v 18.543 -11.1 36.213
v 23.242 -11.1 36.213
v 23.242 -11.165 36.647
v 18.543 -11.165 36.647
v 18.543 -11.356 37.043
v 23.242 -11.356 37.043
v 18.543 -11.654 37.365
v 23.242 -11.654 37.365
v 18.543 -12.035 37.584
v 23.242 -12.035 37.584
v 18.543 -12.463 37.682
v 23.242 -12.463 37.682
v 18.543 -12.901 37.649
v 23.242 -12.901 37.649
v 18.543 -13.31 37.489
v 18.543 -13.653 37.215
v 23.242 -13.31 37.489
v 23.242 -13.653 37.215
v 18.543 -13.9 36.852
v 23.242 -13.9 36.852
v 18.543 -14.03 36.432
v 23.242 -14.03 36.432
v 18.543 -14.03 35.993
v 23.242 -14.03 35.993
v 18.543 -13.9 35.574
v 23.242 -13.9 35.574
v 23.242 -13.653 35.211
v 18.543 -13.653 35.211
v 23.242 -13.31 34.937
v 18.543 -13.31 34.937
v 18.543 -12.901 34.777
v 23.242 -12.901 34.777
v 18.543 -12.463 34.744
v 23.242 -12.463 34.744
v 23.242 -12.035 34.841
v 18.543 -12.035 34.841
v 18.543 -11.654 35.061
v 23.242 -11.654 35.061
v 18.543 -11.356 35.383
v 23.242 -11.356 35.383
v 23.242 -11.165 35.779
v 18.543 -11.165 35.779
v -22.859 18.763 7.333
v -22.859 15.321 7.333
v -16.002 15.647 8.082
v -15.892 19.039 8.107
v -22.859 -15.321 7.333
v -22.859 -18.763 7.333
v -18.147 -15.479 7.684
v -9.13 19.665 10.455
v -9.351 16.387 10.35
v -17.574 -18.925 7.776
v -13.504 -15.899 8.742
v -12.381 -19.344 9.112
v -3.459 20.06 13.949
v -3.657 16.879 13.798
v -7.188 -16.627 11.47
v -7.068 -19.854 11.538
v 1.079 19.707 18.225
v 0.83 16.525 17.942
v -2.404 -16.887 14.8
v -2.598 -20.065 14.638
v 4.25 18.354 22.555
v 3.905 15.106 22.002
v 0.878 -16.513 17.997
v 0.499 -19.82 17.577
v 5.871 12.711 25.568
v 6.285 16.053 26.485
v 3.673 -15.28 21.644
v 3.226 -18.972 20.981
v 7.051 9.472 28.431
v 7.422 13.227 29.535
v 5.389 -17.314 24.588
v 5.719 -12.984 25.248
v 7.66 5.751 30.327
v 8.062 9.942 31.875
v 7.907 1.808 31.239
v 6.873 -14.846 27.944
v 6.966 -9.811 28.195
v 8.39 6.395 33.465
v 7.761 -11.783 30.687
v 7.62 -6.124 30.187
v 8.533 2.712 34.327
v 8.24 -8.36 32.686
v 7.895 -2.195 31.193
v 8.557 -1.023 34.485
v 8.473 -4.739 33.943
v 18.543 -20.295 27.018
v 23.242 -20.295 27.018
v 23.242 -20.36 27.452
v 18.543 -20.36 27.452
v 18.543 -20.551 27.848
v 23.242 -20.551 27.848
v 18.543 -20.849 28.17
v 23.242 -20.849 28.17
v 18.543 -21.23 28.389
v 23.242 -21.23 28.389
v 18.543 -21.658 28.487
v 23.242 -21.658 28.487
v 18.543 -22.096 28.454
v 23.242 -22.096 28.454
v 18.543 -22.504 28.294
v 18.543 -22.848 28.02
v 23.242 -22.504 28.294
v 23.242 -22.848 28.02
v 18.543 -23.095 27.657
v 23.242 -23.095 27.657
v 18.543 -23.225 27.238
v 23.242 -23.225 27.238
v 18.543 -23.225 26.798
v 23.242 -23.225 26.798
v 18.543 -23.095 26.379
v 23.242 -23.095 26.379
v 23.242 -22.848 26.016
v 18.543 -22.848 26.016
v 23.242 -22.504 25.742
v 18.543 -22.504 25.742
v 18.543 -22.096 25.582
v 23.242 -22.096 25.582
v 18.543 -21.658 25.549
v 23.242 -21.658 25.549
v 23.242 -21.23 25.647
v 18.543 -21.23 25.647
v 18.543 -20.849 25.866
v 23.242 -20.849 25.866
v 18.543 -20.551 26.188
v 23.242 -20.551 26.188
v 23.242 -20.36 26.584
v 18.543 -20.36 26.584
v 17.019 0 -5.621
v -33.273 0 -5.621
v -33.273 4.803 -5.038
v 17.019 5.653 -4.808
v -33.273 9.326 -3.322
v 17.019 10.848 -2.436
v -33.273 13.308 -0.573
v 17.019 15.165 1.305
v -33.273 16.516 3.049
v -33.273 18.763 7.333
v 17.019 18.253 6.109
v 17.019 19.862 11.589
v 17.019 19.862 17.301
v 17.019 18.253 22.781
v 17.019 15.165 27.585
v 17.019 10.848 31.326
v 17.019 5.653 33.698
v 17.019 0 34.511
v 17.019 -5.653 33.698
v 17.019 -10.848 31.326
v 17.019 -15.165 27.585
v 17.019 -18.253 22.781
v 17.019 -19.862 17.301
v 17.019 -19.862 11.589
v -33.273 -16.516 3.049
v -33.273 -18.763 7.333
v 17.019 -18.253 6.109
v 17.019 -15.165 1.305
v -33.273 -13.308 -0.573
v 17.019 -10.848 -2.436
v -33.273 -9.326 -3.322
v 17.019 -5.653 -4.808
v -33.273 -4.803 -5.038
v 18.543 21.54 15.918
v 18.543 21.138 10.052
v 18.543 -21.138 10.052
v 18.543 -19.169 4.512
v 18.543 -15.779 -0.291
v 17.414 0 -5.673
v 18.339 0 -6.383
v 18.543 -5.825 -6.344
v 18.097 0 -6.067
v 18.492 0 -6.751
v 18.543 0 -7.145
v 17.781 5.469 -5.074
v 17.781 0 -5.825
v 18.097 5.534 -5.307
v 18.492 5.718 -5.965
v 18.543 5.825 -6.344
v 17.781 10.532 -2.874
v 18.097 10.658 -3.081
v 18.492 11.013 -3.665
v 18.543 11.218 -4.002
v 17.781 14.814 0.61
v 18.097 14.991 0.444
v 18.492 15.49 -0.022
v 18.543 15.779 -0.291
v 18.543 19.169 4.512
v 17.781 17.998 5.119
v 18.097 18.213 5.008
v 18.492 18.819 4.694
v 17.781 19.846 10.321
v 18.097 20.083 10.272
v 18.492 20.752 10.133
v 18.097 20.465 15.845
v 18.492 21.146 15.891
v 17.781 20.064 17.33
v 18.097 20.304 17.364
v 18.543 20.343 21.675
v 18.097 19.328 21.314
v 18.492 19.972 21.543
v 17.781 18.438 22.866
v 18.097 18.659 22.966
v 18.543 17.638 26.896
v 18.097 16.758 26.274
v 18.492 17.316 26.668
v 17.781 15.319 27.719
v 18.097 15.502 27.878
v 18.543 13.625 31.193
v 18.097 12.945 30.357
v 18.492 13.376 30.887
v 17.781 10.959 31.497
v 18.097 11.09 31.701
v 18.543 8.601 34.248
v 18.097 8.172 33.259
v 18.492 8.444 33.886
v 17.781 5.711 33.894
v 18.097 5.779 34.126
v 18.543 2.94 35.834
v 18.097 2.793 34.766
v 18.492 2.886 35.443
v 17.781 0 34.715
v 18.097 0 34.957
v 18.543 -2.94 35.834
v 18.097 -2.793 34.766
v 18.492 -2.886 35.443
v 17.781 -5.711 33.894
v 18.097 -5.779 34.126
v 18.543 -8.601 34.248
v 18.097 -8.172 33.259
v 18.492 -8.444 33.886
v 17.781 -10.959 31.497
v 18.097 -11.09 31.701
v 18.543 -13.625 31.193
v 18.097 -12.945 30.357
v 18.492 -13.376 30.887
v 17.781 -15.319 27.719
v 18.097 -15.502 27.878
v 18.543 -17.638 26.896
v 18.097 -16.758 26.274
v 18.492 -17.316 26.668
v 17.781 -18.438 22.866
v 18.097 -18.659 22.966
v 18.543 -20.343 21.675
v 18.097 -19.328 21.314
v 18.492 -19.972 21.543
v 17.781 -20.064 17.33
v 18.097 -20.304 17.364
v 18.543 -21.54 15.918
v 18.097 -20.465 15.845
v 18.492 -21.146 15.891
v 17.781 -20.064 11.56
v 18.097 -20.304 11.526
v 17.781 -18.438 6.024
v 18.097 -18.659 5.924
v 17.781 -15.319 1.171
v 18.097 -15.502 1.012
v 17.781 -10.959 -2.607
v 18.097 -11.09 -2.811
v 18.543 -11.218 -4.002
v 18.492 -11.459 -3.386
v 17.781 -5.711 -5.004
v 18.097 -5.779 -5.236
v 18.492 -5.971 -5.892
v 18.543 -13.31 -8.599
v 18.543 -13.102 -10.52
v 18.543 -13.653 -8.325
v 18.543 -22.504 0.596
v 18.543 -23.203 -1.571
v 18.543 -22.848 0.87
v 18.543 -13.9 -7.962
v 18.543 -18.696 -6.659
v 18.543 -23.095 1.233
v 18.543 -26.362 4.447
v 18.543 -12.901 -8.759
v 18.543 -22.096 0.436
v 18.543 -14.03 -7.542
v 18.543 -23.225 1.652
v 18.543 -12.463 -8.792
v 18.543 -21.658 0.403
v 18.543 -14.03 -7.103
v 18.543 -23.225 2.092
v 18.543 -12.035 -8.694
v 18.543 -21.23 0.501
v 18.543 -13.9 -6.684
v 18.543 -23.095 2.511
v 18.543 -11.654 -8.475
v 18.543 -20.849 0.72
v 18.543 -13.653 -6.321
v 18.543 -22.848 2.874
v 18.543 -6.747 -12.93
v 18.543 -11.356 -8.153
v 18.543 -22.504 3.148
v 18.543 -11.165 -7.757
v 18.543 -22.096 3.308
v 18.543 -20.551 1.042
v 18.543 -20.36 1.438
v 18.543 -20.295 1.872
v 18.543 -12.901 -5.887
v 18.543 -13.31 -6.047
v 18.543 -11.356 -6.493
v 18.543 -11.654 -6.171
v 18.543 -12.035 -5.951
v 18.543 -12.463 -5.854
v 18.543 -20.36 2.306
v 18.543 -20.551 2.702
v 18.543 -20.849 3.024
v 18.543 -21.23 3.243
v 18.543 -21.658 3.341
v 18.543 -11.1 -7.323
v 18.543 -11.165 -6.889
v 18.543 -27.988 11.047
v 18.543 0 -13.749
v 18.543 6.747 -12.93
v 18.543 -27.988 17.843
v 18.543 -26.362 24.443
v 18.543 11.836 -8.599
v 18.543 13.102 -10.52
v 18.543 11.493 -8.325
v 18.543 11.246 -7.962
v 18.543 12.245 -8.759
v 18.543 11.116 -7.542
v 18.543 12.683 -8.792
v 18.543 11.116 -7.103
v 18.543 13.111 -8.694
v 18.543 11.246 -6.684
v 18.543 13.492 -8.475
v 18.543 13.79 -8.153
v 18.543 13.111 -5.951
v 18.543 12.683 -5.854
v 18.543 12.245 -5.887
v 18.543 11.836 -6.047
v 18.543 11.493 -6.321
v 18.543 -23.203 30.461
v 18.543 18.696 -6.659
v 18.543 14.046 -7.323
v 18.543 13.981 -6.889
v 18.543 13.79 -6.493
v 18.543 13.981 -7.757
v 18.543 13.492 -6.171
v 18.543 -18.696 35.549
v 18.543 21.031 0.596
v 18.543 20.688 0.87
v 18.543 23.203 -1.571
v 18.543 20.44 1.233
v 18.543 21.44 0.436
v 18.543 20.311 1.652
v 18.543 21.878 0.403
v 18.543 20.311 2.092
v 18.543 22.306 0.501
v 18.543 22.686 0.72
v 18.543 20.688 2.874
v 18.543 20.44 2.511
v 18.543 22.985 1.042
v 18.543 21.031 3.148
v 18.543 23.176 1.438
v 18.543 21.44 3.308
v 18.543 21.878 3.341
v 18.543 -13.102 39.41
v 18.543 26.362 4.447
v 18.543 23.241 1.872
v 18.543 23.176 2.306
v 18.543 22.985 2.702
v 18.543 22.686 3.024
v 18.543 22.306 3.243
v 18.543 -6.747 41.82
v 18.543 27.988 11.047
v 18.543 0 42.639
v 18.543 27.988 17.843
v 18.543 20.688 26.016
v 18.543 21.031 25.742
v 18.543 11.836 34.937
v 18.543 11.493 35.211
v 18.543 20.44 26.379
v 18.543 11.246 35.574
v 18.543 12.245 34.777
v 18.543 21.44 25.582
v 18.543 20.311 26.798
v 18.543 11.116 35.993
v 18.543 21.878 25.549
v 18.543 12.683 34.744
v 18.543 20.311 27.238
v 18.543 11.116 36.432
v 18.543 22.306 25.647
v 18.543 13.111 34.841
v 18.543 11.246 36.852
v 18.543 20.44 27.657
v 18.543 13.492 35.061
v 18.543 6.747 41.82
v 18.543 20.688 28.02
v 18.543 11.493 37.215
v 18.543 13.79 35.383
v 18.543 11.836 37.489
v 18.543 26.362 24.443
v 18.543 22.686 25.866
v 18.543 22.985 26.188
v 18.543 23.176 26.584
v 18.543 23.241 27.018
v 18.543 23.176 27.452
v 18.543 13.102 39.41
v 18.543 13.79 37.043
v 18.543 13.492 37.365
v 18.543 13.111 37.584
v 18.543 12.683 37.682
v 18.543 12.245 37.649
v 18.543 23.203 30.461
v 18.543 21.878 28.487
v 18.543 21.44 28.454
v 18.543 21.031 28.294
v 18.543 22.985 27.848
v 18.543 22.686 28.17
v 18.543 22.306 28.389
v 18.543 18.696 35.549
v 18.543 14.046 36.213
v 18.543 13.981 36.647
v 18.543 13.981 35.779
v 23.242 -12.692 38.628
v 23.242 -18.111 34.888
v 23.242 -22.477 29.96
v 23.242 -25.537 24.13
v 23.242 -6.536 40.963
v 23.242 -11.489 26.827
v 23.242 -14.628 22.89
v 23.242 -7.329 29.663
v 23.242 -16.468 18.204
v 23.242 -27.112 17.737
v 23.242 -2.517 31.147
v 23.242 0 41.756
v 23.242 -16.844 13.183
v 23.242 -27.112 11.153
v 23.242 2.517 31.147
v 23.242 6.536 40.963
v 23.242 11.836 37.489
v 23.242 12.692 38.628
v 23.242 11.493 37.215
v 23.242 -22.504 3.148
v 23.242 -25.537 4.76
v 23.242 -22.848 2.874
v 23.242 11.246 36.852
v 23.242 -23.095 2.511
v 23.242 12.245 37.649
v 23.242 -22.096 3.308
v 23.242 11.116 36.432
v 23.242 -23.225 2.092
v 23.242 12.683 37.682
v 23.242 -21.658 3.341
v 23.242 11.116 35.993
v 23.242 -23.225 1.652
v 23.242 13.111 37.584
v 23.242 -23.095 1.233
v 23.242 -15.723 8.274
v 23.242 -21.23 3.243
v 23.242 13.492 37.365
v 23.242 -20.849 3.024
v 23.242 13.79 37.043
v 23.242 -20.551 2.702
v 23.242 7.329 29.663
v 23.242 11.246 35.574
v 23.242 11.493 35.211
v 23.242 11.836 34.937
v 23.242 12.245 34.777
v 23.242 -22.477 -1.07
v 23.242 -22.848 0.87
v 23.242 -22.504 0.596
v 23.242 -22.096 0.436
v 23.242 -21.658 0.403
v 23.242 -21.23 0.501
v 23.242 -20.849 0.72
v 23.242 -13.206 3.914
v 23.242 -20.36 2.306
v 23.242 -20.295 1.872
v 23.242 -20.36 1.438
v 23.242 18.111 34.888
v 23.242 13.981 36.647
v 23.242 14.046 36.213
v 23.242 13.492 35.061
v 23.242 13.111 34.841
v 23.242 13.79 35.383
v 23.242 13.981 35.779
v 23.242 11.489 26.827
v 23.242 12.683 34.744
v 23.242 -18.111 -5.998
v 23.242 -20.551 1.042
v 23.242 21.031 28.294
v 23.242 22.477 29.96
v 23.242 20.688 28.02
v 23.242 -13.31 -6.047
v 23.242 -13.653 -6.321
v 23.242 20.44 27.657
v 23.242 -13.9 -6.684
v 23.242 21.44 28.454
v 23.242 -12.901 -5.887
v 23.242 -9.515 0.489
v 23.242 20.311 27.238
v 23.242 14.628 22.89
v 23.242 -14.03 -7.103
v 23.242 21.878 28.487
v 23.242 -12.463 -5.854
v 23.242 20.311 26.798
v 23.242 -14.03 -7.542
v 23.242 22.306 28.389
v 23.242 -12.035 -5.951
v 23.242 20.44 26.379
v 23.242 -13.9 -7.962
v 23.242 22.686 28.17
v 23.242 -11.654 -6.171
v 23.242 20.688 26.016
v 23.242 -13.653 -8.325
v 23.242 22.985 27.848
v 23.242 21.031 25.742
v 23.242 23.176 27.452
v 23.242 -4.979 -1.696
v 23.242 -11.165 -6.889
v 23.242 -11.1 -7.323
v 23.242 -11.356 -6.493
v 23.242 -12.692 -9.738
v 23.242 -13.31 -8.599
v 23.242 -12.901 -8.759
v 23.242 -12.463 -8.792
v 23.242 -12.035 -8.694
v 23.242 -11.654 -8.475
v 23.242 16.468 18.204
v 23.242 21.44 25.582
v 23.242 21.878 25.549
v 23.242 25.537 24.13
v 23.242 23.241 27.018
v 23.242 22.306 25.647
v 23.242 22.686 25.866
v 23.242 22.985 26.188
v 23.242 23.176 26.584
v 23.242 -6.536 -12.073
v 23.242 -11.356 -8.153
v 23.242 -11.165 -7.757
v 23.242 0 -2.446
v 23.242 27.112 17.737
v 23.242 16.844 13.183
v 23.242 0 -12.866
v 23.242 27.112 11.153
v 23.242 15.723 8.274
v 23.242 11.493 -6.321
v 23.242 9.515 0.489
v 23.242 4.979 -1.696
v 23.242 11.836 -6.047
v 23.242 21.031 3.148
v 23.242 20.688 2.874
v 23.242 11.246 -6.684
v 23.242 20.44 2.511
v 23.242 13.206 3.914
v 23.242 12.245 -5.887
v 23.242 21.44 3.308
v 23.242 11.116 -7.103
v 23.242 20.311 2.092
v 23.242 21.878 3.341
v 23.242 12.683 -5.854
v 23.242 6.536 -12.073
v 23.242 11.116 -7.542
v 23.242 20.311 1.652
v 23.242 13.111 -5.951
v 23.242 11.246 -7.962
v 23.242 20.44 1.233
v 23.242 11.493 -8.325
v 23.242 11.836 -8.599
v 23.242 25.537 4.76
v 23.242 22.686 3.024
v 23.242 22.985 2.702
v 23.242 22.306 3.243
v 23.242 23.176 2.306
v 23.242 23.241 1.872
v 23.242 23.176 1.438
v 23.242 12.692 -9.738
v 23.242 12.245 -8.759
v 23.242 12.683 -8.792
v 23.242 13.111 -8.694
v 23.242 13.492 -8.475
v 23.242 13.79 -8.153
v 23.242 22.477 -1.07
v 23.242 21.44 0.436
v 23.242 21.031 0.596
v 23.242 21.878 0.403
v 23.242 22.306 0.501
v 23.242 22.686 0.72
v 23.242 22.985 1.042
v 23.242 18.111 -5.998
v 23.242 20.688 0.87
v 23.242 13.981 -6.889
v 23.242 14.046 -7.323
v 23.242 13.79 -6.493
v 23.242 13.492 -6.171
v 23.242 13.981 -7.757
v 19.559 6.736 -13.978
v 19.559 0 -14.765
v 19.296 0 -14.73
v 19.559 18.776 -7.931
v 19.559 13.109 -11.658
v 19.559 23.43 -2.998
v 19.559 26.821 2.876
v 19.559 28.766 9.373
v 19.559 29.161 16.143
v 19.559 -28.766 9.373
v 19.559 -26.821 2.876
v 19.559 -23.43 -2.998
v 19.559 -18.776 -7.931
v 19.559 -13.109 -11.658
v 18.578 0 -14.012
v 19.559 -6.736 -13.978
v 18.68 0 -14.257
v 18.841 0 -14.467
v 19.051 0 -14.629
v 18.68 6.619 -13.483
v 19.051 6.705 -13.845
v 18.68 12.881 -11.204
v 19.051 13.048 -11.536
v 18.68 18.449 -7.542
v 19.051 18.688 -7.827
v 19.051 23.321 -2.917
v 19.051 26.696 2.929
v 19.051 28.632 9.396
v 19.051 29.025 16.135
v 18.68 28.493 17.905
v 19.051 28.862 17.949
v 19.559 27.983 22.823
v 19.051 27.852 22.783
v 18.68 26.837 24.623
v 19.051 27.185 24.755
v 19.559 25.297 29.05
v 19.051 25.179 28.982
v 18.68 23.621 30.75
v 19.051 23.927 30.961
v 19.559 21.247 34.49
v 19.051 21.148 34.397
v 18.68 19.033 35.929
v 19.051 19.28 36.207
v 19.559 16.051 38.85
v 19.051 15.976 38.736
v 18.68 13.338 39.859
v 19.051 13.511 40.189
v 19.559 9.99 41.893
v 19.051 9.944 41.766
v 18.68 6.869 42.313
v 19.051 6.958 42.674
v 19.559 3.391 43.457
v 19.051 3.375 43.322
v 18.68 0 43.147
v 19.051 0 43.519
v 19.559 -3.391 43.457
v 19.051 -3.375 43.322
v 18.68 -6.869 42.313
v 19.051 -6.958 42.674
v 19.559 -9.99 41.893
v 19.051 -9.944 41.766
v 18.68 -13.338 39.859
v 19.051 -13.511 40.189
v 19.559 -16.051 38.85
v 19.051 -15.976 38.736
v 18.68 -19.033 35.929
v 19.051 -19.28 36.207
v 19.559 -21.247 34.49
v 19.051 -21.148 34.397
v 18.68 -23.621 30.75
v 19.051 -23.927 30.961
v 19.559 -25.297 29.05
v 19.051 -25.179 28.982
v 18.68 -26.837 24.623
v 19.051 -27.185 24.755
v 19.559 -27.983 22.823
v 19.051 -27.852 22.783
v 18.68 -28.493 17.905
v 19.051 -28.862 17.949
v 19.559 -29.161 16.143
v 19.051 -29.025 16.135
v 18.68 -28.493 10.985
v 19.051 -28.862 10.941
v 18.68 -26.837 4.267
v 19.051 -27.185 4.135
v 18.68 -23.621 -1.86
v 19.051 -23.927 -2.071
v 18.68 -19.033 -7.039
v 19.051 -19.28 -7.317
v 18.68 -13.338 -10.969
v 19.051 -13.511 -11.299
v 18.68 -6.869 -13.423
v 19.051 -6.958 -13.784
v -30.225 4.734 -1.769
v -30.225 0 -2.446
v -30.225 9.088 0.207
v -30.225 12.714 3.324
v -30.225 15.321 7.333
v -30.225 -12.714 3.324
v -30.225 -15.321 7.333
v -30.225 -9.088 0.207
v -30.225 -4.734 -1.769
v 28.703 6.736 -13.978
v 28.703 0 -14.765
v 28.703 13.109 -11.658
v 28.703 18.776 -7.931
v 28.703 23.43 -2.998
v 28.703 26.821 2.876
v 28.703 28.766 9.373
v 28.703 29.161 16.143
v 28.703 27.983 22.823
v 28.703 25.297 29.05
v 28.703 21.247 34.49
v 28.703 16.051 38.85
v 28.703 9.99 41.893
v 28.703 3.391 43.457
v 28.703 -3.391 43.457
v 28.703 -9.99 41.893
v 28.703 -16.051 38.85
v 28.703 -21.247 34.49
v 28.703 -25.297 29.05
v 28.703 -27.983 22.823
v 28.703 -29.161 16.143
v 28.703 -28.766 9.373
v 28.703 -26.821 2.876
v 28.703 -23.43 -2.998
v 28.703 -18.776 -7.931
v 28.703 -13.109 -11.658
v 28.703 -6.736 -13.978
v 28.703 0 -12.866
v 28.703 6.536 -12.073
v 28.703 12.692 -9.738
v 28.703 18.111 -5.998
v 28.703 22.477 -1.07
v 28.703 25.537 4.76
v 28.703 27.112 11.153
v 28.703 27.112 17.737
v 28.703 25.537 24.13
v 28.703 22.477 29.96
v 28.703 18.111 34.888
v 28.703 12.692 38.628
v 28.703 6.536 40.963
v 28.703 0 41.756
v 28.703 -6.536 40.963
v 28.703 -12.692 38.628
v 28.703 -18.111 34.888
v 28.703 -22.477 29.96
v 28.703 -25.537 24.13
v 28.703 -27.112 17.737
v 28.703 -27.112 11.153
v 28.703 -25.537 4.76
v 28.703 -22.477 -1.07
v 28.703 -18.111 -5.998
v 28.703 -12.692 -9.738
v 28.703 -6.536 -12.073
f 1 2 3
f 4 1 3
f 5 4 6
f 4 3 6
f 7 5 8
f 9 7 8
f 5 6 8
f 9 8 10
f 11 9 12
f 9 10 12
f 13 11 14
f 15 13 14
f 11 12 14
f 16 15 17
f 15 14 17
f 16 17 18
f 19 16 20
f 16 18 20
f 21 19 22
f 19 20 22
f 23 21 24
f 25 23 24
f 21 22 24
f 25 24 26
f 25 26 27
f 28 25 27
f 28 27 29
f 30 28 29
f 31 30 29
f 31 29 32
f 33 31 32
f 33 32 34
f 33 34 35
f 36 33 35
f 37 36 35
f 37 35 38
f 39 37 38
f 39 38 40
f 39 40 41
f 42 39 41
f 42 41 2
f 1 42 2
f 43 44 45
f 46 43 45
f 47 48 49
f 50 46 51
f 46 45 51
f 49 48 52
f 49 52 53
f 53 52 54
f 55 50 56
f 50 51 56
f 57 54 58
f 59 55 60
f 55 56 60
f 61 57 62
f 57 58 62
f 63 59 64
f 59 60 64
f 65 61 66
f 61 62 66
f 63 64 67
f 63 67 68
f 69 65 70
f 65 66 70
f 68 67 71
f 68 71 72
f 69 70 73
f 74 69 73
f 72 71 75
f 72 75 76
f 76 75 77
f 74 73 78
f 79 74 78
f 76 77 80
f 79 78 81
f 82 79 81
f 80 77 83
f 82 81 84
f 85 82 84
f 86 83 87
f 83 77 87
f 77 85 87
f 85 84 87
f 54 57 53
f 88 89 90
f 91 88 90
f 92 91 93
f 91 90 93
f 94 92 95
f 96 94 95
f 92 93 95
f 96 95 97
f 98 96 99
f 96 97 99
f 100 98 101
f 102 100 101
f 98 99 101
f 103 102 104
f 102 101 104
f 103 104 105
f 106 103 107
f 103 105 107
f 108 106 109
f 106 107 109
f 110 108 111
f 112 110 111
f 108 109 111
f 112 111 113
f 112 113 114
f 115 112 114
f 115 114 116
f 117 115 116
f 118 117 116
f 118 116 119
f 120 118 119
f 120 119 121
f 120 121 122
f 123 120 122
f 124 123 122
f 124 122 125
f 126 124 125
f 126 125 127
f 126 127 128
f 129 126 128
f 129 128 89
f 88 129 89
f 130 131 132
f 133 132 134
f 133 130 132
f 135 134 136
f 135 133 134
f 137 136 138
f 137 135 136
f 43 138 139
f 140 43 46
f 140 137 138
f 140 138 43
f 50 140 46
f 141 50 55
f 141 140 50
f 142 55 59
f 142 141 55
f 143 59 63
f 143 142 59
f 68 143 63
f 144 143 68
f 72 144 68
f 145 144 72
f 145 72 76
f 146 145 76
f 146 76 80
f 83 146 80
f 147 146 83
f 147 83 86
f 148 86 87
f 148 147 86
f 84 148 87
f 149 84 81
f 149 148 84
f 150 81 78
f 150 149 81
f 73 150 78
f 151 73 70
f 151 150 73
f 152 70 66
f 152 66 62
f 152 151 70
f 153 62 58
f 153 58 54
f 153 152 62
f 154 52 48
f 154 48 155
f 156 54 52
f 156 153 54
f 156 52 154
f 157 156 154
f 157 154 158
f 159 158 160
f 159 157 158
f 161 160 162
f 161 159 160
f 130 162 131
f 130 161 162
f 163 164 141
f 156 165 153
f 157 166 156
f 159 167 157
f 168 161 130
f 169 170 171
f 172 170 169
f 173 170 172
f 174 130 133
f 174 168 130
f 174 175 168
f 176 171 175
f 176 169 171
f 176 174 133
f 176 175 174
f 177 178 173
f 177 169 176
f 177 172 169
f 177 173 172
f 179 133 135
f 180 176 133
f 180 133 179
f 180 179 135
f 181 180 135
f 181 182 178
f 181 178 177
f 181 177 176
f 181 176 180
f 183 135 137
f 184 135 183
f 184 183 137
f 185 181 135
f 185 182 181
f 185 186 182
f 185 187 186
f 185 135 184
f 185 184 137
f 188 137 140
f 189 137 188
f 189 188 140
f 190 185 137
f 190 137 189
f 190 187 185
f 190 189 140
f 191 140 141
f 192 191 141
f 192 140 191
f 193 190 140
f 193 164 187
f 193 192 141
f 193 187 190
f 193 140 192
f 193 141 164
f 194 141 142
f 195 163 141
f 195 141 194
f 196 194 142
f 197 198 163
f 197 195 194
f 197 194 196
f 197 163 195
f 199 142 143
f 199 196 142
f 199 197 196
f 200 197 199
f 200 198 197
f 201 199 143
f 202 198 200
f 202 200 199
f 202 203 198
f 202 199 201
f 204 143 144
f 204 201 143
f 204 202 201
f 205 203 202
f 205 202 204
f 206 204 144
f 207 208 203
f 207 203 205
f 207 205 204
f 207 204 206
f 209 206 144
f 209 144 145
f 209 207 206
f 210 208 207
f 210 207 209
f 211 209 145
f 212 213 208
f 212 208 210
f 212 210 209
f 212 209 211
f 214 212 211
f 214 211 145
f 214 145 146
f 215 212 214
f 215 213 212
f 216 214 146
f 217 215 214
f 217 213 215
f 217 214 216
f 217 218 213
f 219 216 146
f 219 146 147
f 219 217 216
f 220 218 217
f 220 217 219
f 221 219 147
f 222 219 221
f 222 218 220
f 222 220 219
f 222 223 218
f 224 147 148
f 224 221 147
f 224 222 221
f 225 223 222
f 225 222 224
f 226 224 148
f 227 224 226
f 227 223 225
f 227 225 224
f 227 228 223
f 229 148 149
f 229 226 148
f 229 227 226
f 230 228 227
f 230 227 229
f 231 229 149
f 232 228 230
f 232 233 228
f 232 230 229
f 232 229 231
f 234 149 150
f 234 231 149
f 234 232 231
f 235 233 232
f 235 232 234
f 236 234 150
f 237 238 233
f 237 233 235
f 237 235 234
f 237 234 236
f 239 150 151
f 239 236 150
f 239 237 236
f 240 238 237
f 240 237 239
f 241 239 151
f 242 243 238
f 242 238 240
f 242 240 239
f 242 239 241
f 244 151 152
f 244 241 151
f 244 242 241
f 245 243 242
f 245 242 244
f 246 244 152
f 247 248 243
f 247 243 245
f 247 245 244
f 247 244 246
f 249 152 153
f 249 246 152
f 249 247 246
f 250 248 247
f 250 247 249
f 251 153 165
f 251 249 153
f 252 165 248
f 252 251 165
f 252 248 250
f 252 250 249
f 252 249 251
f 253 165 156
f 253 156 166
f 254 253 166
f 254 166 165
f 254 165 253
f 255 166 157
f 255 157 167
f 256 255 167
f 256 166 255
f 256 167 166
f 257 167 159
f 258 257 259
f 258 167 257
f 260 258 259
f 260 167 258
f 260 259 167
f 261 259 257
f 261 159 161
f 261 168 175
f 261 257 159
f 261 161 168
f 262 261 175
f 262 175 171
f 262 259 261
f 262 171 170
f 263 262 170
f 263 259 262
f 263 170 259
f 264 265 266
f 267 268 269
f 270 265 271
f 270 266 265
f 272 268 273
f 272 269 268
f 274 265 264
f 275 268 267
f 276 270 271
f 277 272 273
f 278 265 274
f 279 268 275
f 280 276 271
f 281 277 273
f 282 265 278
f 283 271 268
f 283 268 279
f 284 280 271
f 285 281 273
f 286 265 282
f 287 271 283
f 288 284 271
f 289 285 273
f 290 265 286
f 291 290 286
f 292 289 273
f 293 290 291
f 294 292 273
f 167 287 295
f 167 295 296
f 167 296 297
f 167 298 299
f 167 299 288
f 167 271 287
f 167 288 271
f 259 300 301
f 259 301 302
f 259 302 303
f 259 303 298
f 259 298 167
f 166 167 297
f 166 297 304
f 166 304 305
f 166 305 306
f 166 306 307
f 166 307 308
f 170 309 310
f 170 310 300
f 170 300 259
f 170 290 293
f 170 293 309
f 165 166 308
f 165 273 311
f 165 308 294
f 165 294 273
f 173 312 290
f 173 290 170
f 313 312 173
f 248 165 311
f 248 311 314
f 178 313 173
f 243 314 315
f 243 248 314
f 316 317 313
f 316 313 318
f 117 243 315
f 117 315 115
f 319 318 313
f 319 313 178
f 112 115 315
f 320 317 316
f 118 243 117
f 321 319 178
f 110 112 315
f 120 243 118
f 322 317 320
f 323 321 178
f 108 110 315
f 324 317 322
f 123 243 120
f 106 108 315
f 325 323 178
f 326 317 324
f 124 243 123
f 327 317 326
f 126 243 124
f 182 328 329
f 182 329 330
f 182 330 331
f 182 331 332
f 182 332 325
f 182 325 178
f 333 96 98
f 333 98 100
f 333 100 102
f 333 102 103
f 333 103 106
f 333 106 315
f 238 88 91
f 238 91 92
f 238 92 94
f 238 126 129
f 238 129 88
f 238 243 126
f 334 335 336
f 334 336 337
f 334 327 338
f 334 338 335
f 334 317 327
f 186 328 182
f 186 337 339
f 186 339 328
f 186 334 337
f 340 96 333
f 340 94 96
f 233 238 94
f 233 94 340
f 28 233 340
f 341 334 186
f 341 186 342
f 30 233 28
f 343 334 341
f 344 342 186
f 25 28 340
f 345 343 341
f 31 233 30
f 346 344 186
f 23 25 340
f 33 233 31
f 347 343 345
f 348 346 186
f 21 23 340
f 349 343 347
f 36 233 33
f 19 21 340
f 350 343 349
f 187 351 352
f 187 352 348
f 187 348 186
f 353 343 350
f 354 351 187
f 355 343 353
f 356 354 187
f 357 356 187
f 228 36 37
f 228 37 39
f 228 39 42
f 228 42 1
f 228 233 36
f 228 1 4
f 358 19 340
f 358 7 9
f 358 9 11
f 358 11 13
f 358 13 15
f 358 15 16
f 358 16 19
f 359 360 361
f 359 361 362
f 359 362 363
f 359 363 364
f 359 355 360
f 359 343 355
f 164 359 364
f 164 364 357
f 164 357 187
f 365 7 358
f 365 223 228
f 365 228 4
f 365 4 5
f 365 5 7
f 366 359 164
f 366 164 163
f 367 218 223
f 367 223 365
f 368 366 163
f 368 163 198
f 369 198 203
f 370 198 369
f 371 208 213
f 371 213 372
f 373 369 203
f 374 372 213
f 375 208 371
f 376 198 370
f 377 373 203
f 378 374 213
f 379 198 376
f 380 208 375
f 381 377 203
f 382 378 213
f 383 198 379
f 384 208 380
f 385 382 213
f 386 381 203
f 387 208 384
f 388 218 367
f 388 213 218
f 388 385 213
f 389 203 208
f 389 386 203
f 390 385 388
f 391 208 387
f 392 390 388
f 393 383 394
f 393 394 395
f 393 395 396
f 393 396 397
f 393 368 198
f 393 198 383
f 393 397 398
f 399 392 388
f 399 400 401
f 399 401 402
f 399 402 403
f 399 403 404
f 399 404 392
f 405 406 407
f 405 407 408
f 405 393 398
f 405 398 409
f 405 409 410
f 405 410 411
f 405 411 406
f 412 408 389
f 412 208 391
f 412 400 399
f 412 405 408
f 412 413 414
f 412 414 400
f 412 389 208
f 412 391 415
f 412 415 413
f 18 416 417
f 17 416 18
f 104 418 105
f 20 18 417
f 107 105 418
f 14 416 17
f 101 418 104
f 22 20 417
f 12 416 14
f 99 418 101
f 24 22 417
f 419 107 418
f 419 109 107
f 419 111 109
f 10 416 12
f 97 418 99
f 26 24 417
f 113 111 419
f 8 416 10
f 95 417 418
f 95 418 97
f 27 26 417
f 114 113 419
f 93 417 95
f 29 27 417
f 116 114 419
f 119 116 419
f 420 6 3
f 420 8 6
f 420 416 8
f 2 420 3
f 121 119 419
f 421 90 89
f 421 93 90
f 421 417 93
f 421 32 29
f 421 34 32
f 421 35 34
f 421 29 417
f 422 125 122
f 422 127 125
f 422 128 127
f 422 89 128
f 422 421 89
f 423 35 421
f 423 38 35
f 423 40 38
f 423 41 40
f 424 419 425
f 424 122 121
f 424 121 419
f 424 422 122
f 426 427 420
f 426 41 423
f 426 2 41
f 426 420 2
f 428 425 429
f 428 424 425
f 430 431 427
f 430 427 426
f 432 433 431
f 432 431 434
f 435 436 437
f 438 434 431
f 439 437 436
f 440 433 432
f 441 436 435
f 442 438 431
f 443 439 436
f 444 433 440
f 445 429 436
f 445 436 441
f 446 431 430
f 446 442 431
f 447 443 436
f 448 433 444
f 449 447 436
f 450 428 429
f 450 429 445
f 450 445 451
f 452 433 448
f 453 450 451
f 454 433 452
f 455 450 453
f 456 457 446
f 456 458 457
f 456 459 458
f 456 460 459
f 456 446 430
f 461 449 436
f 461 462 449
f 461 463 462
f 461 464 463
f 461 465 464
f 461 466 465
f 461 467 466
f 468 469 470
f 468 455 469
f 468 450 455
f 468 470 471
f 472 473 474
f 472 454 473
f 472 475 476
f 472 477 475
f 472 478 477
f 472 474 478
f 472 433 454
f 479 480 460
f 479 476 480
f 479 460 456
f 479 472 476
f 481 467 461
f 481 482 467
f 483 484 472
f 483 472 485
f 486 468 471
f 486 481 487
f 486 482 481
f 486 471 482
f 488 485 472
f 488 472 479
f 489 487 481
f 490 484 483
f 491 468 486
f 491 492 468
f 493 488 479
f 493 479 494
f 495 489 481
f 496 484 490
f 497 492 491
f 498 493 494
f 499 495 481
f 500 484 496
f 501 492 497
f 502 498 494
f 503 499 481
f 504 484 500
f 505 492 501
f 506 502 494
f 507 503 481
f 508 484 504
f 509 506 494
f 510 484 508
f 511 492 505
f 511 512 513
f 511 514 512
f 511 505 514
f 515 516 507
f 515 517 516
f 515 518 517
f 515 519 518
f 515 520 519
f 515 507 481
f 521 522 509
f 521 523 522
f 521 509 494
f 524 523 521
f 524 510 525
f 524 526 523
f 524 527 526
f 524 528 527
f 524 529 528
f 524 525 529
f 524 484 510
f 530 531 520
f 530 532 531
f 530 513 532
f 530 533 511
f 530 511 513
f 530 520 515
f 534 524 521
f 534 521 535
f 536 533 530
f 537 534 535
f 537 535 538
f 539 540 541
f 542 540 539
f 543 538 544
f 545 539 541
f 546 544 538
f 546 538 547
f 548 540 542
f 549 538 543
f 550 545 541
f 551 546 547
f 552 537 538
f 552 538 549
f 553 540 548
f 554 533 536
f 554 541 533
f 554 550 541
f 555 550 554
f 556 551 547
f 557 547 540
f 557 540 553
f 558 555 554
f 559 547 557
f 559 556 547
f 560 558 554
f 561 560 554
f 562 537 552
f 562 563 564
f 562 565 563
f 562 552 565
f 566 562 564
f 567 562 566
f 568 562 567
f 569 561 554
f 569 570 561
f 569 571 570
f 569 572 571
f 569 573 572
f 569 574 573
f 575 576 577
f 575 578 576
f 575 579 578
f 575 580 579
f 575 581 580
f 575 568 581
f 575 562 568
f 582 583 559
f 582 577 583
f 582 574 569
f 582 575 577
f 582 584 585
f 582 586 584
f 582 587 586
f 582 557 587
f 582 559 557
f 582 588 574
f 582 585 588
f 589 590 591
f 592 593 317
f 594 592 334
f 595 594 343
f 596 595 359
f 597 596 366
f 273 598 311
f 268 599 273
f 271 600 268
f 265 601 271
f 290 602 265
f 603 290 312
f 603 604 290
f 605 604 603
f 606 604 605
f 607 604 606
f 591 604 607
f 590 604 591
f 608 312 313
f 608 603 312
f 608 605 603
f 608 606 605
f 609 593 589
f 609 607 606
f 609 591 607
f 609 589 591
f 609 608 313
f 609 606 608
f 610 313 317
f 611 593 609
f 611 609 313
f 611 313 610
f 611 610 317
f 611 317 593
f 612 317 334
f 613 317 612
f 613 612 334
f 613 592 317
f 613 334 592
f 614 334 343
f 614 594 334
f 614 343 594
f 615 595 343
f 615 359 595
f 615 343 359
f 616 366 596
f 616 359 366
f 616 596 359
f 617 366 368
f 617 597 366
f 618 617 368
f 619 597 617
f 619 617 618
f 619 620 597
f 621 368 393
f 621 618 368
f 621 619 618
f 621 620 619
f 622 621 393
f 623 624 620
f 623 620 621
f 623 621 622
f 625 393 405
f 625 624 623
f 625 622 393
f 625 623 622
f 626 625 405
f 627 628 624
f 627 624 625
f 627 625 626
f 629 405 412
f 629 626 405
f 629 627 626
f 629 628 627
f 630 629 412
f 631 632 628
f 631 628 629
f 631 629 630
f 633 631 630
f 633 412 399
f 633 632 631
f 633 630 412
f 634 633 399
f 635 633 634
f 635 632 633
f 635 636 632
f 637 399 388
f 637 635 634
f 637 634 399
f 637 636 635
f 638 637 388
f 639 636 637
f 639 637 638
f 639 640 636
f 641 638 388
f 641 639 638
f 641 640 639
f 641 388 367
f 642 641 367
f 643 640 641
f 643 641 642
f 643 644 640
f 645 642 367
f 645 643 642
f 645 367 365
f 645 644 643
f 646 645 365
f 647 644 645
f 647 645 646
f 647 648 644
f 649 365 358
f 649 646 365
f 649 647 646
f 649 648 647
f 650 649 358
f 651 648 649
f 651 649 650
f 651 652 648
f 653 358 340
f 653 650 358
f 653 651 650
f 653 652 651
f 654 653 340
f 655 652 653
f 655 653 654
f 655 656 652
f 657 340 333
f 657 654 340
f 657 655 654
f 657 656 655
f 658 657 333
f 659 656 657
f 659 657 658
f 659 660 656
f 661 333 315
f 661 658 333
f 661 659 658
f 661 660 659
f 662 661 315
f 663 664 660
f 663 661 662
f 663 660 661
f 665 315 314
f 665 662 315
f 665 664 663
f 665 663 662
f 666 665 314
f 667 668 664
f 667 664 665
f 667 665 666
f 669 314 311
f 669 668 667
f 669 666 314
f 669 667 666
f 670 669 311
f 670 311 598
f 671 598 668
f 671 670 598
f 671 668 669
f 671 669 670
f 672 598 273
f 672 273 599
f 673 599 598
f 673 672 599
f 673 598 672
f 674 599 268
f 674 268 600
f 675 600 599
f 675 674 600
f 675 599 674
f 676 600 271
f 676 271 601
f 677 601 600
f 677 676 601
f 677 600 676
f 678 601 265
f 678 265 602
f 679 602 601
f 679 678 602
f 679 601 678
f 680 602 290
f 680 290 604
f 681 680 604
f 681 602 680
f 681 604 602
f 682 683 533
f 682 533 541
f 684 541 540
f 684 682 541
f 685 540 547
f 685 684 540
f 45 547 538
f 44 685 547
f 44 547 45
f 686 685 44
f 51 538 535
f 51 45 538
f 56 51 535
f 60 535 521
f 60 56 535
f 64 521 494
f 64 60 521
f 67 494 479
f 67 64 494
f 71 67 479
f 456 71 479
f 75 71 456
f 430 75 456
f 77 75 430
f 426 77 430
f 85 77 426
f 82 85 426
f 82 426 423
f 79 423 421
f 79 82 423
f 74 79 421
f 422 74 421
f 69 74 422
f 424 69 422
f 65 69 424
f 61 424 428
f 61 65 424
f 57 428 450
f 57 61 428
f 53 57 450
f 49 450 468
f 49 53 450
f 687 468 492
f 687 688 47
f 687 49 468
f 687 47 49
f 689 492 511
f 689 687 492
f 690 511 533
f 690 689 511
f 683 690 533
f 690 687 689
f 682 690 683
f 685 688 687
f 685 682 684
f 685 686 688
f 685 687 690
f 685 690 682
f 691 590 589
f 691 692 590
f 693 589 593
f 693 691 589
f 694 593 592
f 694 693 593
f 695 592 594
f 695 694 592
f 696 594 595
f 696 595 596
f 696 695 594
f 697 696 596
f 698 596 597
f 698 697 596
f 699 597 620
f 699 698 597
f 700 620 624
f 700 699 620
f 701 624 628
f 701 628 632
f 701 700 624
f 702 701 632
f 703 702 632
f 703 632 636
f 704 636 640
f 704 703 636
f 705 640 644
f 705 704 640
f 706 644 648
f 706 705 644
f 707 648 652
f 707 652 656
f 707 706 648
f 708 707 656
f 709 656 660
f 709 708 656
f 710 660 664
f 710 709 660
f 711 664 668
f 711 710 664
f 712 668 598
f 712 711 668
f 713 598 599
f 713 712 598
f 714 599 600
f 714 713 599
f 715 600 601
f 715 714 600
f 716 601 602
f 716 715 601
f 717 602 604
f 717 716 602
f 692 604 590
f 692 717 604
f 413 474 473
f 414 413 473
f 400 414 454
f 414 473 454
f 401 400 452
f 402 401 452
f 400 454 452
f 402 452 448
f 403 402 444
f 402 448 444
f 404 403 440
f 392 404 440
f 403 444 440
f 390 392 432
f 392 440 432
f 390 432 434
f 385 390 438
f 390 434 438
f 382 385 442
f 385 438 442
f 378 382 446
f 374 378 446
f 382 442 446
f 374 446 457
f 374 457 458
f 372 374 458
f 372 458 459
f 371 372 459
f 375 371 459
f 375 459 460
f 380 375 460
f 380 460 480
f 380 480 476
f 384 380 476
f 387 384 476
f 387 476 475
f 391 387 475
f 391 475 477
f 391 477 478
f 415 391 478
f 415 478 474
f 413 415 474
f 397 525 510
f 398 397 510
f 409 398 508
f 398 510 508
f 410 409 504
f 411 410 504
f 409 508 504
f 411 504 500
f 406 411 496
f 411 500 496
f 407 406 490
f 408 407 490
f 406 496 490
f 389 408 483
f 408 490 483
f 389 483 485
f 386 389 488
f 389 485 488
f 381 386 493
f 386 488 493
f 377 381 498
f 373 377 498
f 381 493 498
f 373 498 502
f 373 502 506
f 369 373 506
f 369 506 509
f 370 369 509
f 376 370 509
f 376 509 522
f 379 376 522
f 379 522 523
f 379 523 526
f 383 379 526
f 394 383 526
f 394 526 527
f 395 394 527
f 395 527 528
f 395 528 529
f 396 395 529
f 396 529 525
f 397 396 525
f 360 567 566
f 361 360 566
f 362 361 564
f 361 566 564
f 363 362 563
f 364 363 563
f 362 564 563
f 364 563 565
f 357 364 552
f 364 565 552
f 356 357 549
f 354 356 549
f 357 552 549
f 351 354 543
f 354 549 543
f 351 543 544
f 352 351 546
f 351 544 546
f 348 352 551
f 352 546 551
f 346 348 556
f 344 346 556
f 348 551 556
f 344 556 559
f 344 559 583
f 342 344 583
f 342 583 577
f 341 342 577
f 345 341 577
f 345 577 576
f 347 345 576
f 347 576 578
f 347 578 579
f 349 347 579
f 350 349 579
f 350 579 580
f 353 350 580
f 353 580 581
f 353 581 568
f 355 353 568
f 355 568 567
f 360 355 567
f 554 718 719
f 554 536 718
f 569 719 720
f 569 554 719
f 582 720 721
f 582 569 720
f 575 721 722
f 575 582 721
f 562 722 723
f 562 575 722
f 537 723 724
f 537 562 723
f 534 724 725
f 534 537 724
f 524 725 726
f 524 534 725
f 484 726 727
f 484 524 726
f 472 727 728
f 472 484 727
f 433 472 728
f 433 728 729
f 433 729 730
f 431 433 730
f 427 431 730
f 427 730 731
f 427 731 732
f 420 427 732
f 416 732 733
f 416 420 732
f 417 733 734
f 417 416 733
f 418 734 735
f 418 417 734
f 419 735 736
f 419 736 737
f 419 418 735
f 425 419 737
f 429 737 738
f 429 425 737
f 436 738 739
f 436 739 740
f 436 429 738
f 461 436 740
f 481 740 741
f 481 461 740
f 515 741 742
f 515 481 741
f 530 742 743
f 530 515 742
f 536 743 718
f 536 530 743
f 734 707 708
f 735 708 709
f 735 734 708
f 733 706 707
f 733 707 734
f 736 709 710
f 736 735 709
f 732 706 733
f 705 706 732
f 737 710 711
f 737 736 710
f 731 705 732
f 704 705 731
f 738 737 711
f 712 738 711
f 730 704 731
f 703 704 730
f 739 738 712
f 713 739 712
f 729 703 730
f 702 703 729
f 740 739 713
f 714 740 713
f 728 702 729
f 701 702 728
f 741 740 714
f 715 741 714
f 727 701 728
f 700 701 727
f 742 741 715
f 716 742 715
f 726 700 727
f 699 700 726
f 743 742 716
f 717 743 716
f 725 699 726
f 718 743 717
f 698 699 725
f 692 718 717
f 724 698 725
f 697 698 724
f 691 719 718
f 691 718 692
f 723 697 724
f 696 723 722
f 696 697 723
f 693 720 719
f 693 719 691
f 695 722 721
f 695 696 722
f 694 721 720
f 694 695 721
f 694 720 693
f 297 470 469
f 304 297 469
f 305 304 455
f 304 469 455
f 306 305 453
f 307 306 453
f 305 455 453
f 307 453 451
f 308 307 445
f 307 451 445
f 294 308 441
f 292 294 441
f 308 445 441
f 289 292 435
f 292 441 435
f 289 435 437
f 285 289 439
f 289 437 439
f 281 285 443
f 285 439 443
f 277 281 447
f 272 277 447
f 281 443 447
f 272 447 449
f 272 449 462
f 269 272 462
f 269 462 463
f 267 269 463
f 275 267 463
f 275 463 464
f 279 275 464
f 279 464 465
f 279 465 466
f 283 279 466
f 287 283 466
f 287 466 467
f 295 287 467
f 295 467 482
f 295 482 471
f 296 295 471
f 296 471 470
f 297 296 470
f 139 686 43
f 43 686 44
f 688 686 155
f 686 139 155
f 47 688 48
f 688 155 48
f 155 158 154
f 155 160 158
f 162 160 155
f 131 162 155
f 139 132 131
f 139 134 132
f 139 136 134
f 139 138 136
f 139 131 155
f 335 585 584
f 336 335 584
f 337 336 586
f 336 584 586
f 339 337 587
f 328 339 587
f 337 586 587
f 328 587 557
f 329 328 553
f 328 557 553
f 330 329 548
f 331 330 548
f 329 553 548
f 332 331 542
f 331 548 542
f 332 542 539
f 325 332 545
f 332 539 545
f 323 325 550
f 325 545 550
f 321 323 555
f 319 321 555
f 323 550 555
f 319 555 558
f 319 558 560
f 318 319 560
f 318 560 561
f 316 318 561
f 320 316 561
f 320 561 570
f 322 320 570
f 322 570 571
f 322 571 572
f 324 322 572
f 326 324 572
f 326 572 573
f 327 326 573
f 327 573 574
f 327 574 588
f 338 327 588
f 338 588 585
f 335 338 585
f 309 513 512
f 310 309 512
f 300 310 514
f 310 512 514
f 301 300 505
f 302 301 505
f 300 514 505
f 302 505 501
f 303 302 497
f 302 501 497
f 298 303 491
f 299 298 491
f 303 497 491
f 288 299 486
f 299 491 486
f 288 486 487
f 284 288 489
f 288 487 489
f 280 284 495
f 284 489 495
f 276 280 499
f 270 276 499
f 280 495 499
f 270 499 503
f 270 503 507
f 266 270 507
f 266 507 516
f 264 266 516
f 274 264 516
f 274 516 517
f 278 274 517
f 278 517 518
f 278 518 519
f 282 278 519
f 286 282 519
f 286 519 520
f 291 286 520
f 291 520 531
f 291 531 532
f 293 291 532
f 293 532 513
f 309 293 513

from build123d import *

# Parameters (mm, degrees)
F3_DEPTH = 29.0322
F5_D     = 2.9464


with BuildPart() as f1:
    # F0 (on Front) → F1 (revolve)
    with BuildSketch(Plane.XZ):
        with BuildLine():
            Line((-33.2725646531, 12.9185590085), (-33.2725646531, -5.6210034922))
            Line((-33.2725646531, -5.6210034922), (17.0194353469, -5.6210034922))
            ThreePointArc((17.0194353469, -5.6210034922), (18.0970660814, -6.0673727577), (18.5434353469, -7.1450034922))
            Line((18.5434353469, -7.1450034922), (18.5434353469, -13.7490034922))
            ThreePointArc((18.5434353469, -13.7490034922), (18.8410148572, -14.4674239819), (19.5594353469, -14.7650034922))
            Line((19.5594353469, -14.7650034922), (28.7034353469, -14.7650034922))
            Line((28.7034353469, -14.7650034922), (28.7034353469, -12.8663534922))
            Line((28.7034353469, -12.8663534922), (23.2424353469, -12.8663534922))
            Line((23.2424353469, -12.8663534922), (23.2424353469, -2.4460034922))
            Line((23.2424353469, -2.4460034922), (-30.2245646531, -2.4460034922))
            Line((-30.2245646531, -2.4460034922), (-30.2245646531, 12.9185590085))
            Line((-30.2245646531, 12.9185590085), (-33.2725646531, 12.9185590085))
        make_face()
    revolve(axis=Axis((-6.179202348, 0, 14.4449965078), (1, 0, 0)))

    # F2 (on Front) → F3 (cut, symmetric)
    with BuildSketch(Plane.XZ):
        with BuildLine():
            Line((8.8914353469, 39.0829965078), (8.8914353469, 42.0824922621))
            Line((8.8914353469, 42.0824922621), (-33.2725646531, 42.0824922621))
            Line((-33.2725646531, 42.0824922621), (-33.2725646531, 34.5109965078))
            Line((-33.2725646531, 34.5109965078), (-33.2725646531, 7.3329965078))
            Line((-33.2725646531, 7.3329965078), (-22.8585646531, 7.3329965078))
            ThreePointArc((-22.8585646531, 7.3329965078), (-0.4079243504, 16.6323562051), (8.8914353469, 39.0829965078))
        make_face()
    extrude(amount=F3_DEPTH, both=True, mode=Mode.SUBTRACT)

    # F5 (through all)
    with Locations(Plane(origin=(18.5434353469, 0, 0), x_dir=(0, -1, 0), z_dir=(-1, 0, 0))):
        with Locations((12.573, 36.2127965078), (21.7678, 27.0179965078), (-12.573, 36.2127965078), (-21.7678, 27.0179965078), (21.7678, 1.8719965078), (12.573, -7.3228034922), (-12.573, -7.3228034922), (-21.7678, 1.8719965078)):
            Hole(F5_D / 2)


solid = f1.part
